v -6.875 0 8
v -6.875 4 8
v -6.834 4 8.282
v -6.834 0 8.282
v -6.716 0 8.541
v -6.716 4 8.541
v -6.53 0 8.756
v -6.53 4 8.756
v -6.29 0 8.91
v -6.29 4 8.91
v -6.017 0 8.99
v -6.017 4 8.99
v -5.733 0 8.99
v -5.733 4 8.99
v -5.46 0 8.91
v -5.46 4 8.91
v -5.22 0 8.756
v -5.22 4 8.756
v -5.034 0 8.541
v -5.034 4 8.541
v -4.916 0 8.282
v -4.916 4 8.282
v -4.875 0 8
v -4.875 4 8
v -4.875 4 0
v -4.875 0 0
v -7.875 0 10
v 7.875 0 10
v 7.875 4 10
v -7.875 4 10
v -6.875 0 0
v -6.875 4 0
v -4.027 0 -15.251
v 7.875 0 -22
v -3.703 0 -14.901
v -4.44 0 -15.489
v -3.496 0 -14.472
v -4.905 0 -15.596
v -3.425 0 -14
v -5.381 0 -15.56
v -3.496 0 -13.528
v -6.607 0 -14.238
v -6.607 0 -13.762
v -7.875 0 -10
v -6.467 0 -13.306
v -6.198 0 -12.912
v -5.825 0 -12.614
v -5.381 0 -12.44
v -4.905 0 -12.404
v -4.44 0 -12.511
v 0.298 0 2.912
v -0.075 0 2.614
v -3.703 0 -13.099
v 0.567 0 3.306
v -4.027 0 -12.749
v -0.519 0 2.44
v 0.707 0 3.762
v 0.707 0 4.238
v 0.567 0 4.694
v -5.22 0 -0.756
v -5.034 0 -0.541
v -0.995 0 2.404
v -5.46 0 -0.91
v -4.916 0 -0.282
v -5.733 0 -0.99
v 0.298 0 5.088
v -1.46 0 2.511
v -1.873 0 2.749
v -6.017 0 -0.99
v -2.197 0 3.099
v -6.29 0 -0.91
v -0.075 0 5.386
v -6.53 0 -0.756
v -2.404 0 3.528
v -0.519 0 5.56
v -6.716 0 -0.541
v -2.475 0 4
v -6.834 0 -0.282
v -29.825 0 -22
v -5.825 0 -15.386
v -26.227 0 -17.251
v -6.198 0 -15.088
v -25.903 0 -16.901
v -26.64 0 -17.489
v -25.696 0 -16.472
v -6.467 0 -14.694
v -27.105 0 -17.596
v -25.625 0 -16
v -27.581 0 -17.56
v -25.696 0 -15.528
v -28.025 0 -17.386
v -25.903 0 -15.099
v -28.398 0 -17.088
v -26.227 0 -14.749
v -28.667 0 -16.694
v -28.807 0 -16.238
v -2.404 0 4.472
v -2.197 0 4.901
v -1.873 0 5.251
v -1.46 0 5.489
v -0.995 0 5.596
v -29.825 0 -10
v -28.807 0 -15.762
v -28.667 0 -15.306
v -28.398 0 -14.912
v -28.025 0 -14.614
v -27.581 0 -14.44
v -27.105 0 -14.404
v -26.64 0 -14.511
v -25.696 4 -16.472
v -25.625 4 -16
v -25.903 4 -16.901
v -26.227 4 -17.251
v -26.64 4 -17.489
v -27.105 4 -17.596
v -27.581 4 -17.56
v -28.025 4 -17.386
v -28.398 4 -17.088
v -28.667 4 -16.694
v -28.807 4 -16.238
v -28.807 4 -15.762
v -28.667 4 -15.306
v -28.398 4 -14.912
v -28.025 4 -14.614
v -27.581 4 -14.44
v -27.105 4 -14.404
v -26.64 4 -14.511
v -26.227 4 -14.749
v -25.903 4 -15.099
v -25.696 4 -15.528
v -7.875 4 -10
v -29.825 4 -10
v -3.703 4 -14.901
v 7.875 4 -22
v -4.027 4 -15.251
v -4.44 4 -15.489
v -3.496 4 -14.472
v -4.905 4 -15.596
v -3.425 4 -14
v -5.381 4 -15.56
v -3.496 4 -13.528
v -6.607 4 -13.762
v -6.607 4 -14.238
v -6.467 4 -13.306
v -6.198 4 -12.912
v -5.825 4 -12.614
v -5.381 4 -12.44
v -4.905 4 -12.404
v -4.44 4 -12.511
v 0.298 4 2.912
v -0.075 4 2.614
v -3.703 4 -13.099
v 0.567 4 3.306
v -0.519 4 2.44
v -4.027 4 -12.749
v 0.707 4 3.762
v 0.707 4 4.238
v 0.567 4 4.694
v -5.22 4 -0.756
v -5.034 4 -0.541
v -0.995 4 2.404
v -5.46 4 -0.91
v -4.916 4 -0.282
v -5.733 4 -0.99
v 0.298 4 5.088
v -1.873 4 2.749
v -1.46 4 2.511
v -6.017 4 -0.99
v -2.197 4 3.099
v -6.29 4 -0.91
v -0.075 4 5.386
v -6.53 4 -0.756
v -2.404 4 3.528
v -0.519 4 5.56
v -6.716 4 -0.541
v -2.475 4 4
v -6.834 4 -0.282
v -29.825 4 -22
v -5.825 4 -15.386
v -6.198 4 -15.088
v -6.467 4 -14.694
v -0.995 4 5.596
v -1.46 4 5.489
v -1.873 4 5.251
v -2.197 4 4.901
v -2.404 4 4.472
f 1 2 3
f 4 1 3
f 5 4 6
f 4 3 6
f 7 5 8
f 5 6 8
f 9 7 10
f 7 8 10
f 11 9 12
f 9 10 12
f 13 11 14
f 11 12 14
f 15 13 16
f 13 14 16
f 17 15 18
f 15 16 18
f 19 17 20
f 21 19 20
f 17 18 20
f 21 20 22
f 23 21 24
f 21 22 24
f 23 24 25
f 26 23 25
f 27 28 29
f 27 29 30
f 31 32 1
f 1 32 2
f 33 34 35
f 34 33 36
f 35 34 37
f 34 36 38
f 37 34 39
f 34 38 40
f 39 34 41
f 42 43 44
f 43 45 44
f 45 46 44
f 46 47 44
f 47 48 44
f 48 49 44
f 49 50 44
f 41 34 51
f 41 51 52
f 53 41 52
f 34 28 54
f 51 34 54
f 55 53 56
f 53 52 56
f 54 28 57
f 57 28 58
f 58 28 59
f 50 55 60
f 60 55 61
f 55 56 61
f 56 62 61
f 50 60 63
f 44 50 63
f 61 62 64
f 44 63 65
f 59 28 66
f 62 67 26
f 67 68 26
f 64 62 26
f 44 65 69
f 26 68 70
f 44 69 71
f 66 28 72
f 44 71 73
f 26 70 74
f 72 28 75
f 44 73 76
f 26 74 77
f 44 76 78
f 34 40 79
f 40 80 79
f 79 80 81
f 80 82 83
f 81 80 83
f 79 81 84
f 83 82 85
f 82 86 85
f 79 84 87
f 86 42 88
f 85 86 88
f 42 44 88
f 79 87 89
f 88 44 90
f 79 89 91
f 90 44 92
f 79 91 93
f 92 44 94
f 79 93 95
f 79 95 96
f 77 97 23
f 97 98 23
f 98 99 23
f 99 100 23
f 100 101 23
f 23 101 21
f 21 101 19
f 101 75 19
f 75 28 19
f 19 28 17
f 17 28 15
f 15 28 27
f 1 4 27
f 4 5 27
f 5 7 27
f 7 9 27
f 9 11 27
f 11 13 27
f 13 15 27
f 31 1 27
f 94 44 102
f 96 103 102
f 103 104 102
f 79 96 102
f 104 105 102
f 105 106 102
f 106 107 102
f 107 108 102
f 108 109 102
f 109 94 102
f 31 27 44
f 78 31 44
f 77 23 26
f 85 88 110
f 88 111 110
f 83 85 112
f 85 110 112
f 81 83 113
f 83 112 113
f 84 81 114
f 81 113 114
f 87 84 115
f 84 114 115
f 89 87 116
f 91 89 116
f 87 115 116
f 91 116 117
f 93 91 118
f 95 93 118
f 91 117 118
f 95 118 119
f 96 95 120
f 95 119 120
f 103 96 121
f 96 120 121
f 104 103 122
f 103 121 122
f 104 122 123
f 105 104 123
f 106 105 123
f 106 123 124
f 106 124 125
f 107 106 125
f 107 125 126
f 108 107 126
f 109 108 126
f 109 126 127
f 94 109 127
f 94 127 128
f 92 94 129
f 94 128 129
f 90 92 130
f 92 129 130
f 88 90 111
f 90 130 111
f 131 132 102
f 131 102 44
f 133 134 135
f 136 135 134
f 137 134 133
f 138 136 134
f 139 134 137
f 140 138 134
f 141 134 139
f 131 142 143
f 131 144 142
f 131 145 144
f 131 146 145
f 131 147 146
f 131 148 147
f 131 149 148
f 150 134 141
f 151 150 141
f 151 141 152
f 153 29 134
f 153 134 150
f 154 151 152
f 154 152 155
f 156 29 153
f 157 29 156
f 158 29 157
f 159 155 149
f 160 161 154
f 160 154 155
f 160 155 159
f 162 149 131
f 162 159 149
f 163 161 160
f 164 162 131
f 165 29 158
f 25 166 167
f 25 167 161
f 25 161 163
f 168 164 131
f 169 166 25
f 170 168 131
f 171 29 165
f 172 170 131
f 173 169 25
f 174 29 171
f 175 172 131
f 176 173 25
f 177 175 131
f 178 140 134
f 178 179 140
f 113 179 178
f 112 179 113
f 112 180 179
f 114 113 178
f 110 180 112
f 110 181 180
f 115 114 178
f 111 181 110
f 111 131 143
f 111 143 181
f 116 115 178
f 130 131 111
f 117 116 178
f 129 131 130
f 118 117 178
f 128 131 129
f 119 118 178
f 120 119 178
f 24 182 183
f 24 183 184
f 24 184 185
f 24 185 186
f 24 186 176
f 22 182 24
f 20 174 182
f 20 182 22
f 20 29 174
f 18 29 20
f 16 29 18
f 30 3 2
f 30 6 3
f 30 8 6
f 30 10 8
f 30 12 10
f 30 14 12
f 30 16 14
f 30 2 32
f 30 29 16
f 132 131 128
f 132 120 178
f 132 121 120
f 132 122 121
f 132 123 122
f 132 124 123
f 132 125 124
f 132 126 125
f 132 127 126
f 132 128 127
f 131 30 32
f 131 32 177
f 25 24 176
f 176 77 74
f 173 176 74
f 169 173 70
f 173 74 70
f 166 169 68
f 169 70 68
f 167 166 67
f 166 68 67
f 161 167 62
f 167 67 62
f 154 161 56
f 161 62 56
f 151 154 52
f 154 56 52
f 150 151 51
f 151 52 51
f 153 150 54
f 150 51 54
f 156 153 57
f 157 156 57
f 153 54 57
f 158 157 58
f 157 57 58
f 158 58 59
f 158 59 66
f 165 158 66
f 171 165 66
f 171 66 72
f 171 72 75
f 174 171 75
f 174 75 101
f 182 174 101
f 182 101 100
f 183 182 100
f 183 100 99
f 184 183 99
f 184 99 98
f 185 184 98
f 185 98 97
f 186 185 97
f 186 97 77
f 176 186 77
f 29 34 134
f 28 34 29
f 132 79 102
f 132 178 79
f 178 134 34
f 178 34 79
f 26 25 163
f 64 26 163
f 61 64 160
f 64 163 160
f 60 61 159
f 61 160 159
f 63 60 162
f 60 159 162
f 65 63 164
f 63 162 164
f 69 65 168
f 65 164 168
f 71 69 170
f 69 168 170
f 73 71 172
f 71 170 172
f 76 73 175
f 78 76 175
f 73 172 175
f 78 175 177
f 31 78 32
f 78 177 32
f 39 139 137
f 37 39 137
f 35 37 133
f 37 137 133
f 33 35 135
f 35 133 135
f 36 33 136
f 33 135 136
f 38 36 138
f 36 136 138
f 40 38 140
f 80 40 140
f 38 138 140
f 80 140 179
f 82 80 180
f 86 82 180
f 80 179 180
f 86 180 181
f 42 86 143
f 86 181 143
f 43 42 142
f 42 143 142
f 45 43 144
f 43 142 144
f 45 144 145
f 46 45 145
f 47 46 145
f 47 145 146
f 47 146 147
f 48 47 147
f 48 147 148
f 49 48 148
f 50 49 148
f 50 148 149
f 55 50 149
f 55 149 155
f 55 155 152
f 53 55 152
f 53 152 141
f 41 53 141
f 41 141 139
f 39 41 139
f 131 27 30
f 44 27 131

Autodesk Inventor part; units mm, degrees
ref_plane "YZ Plane" through (0, 0, 0) normal (1, 0, 0) x (0, 1, 0)
ref_plane "XZ Plane" through (0, 0, 0) normal (0, 1, 0) x (-1, 0, 0)
ref_plane "XY Plane" through (0, 0, 0) normal (0, 0, 1) x (1, 0, 0)
sketch "Эскиз9" plane through (0, 0, 0) normal (0, 1, 0) x (-1, 0, 0)
  line L0 (-7.875, 10) -> (7.875, 10)
  line L1 (7.875, 10) -> (7.875, -10)
  line L2 (7.875, -10) -> (-7.875, -10)
  line L3 (-7.875, -10) -> (-7.875, 10)
  line L4 (-7.875, 10) -> (7.875, -10) construction
  line L5 (7.875, 10) -> (-7.875, -10) construction
  circle A0 centre (0.875, 4) radius 1.6
  point P0 (0, 0)
  point P1 (7.875, 0)
  dimension "d56" = 15.75
  dimension "d57" = 20
  dimension "d58" = 3.2
  dimension "d86" = 6
  dimension "d87" = 7
extrude "Выдавливание9" add sketch "Эскиз9" along normal blind 4
sketch "Эскиз10" plane through (0, 4, 0) normal (0, 1, 0) x (1, 0, 0)
  line L0 (7.875, 22) -> (-29.825, 22)
  line L1 (-29.825, 22) -> (-29.825, 10)
  line L2 (-29.825, 10) -> (7.875, 10)
  line L3 (7.875, 10) -> (7.875, 22)
  line L4 (7.875, 22) -> (-29.825, 10) construction
  line L5 (-29.825, 22) -> (7.875, 10) construction
  line L6 (7.875, 10) -> (-7.875, 10) projected
  line L7 (-7.875, 10) -> (-7.875, -10) projected
  line L8 (7.875, -10) -> (7.875, 10) projected
  point P0 (0, 0)
  point P1 (-10.975, 16)
  point P2 (0, 10)
  point P3 (7.875, 16)
  dimension "d71" = 37.7
  dimension "d72" = 12
extrude "Выдавливание10" add sketch "Эскиз10" against normal blind 4
sketch "Эскиз11" plane through (0, 4, 0) normal (0, 1, 0) x (1, 0, 0)
  circle A0 centre (-14.5, 13) radius 1.6 construction
  circle A1 centre (7.7, 11) radius 1.6 construction
  circle A2 centre (-27.225, 16) radius 1.6
  line L0 (-29.825, 22) -> (-29.825, 10) projected
  line L1 (-29.825, 10) -> (-7.875, 10) projected
  circle A3 centre (-5.025, 14) radius 1.6
  line L2 (7.875, -10) -> (7.875, 22) projected
  point P0 (-29.825, 16)
  dimension "d75" = 3.2
  dimension "d76" = 2.6
  dimension "d77" = 6
  dimension "d78" = 3.2
  dimension "d79" = 4
  dimension "d80" = 12.9
extrude "Выдавливание11" cut sketch "Эскиз11" against normal blind 4
sketch "Эскиз12" plane through (0, 4, 0) normal (0, 1, 0) x (1, 0, 0)
  line L0 (-5.875, 1) -> (-5.875, -9) construction
  line L1 (-6.875, 0) -> (-6.875, -8)
  line L2 (-4.875, -8) -> (-4.875, 0)
  arc A0 (-4.875, 0) -> (-6.875, 0) centre (-5.875, 0) ccw
  arc A1 (-6.875, -8) -> (-4.875, -8) centre (-5.875, -8) ccw
  circle A2 centre (-0.875, -4) radius 1.6 projected
  line L3 (-0.875, -4) -> (-14.063, -4) construction
  point P0 (0, 0)
  point P1 (-5.875, -4)
  dimension "d81" = 10
  dimension "d82" = 2
  dimension "d83" = 5
extrude "Выдавливание12" cut sketch "Эскиз12" against normal blind 4
properties part number "креп_опт" material "Полипропилен"
